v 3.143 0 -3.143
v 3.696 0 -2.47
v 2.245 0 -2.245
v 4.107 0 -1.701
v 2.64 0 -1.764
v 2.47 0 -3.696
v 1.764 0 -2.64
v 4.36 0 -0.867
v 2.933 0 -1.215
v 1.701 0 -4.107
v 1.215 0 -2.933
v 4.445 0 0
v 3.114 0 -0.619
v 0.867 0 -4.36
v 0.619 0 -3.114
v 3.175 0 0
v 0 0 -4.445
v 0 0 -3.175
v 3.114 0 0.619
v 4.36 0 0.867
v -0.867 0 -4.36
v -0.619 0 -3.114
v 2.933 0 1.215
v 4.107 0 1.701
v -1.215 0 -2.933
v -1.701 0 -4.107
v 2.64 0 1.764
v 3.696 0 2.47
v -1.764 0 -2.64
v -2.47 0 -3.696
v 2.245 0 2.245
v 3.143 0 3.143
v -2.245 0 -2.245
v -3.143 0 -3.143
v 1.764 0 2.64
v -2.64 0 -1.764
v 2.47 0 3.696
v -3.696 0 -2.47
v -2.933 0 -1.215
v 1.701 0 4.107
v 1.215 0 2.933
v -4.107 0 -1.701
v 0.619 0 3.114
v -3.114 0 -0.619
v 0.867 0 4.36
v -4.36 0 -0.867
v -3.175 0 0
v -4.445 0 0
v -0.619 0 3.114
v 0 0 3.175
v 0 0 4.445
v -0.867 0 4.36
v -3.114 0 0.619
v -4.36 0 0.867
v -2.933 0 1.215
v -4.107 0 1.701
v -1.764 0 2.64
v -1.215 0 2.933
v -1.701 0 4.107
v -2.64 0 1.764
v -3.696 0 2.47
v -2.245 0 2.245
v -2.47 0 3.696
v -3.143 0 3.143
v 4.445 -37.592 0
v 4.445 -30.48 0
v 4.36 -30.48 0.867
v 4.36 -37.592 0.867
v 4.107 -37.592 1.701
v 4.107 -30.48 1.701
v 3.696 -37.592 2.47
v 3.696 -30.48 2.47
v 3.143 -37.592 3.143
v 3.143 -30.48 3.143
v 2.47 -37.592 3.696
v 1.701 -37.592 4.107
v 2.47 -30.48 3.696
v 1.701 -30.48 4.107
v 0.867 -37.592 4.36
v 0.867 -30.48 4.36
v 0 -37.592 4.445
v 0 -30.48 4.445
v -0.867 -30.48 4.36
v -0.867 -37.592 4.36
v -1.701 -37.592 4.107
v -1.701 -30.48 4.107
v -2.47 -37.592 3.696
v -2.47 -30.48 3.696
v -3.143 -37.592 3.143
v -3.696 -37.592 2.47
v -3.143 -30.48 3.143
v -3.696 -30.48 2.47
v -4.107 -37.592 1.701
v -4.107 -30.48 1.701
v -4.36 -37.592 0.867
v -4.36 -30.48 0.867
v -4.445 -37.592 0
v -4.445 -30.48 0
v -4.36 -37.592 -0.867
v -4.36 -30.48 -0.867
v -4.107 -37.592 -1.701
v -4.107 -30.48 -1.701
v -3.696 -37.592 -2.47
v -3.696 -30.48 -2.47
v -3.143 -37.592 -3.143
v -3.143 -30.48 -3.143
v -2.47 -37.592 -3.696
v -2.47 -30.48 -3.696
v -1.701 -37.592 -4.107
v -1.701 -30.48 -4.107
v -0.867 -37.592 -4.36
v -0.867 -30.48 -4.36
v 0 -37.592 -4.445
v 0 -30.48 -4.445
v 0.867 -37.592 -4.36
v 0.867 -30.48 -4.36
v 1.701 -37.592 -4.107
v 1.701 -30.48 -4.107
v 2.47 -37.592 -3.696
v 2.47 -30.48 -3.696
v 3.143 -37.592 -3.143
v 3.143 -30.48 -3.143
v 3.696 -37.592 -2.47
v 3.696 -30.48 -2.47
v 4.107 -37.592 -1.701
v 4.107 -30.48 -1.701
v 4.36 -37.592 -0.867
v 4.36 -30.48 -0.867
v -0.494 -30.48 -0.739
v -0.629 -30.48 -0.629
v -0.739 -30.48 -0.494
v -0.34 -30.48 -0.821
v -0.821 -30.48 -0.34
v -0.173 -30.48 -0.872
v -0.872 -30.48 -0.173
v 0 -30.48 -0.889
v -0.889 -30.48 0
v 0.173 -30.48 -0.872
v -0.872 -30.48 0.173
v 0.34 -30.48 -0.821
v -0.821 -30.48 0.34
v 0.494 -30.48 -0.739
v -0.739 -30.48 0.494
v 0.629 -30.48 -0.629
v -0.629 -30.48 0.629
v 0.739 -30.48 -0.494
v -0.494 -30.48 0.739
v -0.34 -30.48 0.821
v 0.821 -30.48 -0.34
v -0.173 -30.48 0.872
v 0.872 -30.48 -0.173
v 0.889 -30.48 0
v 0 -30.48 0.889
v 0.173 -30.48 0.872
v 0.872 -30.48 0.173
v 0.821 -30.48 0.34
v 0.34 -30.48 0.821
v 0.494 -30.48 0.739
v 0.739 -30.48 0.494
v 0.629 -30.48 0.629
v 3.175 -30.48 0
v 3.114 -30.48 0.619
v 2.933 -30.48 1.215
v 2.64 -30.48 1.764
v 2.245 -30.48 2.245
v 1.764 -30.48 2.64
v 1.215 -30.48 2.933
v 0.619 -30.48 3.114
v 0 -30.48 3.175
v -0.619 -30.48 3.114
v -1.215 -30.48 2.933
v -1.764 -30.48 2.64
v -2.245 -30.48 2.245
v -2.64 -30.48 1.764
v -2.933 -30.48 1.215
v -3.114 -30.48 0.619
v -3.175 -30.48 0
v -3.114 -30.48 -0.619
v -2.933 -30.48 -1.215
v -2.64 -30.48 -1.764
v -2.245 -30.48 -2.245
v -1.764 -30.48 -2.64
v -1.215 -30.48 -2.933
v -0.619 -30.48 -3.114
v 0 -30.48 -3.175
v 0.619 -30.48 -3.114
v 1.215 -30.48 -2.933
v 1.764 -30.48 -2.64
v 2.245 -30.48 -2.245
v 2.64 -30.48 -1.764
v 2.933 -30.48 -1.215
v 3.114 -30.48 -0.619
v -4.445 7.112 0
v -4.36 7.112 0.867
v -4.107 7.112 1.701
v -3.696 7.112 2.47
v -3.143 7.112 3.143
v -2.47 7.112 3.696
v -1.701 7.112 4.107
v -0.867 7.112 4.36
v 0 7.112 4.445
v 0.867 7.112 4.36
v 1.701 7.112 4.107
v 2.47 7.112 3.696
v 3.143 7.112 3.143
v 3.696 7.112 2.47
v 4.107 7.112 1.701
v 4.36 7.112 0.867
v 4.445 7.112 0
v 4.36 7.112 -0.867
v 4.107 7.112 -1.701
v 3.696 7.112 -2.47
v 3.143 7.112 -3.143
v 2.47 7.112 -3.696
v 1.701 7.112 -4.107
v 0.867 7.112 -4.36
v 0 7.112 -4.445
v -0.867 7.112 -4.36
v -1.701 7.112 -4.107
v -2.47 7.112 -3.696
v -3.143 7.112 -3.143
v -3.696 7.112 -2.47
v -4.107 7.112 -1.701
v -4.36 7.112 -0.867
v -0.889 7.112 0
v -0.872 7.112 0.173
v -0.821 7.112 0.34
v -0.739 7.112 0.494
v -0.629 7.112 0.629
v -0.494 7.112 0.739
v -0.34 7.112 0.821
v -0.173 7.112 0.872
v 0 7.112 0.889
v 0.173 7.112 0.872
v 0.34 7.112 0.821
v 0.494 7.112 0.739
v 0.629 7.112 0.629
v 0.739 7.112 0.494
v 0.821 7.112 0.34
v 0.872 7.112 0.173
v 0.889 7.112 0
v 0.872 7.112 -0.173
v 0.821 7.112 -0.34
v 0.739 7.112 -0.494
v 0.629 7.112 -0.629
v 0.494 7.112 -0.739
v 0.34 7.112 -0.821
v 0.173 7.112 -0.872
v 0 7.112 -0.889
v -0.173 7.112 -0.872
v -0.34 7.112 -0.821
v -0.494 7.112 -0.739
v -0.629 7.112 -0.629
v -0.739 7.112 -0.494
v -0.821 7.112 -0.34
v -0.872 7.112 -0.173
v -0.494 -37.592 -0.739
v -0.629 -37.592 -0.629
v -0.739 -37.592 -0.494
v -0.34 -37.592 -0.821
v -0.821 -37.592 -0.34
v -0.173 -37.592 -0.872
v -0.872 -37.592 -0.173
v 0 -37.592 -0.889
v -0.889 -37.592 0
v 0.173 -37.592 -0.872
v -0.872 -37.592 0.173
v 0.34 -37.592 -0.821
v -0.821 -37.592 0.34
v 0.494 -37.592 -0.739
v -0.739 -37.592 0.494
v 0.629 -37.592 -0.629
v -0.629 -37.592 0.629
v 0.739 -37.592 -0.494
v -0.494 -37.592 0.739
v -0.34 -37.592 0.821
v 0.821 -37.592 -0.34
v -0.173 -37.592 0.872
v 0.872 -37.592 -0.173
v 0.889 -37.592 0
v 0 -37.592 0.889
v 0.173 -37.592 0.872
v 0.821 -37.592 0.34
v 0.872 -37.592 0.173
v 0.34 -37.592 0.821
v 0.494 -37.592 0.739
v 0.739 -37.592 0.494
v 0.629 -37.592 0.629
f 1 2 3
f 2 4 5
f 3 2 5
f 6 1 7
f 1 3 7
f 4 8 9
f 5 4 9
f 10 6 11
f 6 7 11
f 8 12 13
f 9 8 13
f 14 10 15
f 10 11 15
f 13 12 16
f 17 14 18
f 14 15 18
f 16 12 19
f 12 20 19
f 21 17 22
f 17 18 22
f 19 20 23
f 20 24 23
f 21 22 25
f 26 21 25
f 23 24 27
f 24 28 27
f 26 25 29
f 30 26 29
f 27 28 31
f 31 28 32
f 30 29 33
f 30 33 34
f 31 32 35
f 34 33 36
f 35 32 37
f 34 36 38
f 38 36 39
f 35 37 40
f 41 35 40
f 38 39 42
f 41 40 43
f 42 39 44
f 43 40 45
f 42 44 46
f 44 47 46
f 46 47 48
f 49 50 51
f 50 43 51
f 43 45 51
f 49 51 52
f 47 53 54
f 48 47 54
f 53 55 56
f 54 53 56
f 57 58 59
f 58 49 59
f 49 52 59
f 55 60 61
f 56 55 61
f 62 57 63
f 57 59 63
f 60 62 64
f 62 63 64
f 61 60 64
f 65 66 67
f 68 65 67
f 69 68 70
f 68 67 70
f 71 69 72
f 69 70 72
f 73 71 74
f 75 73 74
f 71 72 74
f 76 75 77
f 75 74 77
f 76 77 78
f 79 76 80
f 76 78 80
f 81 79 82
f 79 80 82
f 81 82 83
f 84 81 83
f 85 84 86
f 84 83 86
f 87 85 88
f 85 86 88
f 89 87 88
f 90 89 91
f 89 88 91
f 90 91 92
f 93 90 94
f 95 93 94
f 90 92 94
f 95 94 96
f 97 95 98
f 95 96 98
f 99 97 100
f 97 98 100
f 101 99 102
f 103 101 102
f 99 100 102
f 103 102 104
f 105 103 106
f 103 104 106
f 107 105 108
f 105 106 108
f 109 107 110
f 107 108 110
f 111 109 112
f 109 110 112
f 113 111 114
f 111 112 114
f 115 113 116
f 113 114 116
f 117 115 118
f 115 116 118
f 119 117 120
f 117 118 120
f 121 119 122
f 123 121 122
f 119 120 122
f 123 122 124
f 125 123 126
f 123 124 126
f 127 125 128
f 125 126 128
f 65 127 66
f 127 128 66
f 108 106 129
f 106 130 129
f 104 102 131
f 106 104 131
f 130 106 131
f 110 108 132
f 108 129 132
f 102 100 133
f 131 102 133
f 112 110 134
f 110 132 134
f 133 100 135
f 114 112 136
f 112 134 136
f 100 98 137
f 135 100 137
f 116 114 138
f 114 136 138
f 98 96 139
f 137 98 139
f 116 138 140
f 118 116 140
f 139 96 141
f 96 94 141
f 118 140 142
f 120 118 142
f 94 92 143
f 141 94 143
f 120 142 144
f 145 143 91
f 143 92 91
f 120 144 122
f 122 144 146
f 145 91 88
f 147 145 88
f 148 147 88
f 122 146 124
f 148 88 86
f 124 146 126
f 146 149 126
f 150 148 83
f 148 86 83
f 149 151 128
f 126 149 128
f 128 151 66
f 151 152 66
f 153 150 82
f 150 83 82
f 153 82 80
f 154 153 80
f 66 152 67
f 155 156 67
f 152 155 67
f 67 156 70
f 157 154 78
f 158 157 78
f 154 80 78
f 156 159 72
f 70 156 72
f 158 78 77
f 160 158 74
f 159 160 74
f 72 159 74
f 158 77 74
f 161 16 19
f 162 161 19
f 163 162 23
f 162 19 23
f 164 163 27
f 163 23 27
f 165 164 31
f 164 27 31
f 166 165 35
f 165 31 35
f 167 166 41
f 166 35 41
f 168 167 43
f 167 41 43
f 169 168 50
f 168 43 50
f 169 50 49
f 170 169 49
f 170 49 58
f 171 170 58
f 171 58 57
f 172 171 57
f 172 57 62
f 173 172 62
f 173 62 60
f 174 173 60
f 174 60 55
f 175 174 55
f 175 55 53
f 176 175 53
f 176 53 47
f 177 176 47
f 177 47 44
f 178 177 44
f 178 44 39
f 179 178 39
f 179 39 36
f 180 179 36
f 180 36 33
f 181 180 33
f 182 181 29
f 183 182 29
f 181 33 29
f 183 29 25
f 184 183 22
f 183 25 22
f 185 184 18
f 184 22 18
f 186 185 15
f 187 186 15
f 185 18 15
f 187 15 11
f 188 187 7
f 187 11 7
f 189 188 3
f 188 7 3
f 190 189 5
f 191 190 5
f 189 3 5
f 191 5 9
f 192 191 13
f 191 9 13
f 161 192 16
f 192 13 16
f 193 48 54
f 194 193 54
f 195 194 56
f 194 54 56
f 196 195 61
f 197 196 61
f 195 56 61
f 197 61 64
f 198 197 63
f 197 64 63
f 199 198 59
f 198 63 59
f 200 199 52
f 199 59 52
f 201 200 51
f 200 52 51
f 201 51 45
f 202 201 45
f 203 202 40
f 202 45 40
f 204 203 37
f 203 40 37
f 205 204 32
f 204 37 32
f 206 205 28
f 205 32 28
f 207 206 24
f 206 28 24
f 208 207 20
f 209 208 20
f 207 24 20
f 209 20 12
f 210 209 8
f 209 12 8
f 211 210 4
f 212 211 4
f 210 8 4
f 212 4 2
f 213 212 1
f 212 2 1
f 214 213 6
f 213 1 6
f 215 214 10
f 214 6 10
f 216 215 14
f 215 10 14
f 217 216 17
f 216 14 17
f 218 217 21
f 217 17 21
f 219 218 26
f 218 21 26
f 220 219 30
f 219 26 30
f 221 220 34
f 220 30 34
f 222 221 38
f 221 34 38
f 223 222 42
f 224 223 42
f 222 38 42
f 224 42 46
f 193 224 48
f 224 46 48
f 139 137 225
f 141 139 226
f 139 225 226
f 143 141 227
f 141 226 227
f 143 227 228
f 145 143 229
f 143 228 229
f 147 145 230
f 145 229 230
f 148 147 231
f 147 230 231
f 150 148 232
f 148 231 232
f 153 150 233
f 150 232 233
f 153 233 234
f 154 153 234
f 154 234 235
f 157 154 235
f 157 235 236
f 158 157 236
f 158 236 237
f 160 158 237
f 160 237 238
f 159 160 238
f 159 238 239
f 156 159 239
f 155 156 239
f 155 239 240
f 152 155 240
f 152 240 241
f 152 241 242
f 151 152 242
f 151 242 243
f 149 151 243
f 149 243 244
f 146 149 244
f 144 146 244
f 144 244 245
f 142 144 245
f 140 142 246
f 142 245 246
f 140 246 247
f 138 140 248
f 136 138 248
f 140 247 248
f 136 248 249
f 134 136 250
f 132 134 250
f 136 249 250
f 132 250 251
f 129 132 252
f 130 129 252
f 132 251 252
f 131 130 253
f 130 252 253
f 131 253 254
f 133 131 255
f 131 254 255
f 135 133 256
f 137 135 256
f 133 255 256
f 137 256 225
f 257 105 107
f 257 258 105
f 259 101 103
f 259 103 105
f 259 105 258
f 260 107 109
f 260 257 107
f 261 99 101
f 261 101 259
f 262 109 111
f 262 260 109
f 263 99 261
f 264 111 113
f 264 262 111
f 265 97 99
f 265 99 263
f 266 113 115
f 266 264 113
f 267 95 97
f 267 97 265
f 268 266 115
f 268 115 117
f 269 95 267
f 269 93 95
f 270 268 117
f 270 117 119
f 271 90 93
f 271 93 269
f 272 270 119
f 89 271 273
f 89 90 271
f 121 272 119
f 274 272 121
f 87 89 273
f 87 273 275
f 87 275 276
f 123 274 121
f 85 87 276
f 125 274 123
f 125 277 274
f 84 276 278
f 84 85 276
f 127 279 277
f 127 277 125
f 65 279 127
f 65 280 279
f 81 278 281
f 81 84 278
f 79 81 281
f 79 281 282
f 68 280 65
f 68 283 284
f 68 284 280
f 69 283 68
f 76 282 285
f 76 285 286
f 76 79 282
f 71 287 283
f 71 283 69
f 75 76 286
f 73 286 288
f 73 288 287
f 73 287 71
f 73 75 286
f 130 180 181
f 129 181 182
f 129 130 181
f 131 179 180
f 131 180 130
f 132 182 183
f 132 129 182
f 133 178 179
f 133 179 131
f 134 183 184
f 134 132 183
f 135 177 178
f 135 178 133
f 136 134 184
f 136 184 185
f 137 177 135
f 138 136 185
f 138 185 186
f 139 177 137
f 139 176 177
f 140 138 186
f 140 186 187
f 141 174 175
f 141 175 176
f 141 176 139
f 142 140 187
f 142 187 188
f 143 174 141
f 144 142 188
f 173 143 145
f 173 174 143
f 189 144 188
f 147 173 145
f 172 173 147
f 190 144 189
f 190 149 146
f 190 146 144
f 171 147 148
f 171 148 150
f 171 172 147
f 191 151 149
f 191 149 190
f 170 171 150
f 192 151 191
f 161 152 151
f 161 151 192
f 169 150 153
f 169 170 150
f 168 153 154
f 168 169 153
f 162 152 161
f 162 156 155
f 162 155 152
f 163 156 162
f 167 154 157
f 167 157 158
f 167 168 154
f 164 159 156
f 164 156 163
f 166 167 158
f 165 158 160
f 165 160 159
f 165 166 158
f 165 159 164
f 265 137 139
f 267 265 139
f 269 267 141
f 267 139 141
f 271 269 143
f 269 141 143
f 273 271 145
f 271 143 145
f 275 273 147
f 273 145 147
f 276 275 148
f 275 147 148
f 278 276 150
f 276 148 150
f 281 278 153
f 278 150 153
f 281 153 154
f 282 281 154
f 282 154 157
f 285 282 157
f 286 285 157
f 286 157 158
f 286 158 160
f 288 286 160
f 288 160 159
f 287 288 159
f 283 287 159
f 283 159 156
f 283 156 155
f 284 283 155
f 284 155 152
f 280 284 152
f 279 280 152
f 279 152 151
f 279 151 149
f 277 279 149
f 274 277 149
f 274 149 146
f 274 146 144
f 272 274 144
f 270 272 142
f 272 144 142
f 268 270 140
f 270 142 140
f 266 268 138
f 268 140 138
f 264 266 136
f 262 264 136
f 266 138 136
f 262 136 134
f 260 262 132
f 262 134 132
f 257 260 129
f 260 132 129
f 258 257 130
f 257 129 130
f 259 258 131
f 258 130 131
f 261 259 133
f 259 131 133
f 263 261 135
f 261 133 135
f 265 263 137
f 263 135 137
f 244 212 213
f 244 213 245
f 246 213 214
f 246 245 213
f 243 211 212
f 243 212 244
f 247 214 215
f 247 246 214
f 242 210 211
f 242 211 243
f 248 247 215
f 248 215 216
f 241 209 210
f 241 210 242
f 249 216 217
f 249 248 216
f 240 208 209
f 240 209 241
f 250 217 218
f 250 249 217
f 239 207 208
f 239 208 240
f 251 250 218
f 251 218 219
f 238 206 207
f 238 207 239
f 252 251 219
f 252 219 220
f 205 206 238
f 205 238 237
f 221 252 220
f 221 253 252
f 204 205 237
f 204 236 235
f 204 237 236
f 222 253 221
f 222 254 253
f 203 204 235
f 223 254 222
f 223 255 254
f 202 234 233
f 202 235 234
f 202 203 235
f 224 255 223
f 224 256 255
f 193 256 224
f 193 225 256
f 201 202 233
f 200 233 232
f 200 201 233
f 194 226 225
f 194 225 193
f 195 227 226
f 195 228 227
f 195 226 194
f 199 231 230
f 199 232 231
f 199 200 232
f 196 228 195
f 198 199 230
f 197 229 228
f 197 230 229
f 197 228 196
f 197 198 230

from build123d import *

# Parameters (mm, degrees)
F0_R     = 3.175
F1_DEPTH = 30.48
F3_R     = 4.445
F3_R_2   = 3.175
F4_DEPTH = 7.112
F2_R     = 3.175
F5_R     = 4.445
F5_R_2   = 3.175
F6_DEPTH = 7.112
F7_R     = 0.889
F8_DEPTH = 66.294


with BuildPart() as f1:
    # F0 (on Front) → F1 (new body)
    with BuildSketch(Plane.XZ):
        Circle(F0_R)
    extrude(amount=F1_DEPTH)

    # F2 (on face) + F5 (on face) → F6 (join)
    with BuildSketch(Plane(origin=(0, 0, 0), x_dir=(-1, 0, 0), z_dir=(0, 1, 0))):
        Circle(F2_R)
    with BuildSketch(Plane(origin=(0, 0, 0), x_dir=(-1, 0, 0), z_dir=(0, 1, 0))):
        Circle(F5_R)
        Circle(F5_R_2, mode=Mode.SUBTRACT)
    extrude(amount=F6_DEPTH)


with BuildPart() as f4:
    # F3 (on face) → F4 (new body)
    with BuildSketch(Plane.XZ.offset(30.48)):
        Circle(F3_R)
        Circle(F3_R_2, mode=Mode.SUBTRACT)
        Circle(F3_R_2)
    extrude(amount=F4_DEPTH)


with BuildPart() as f8_tool:
    # F7 (on face) → F8 (new body)
    with BuildSketch(Plane(origin=(0, 7.112, 0), x_dir=(-1, 0, 0), z_dir=(0, 1, 0))):
        Circle(F7_R)
    extrude(amount=-F8_DEPTH)


with BuildPart() as f1_1:
    add(f1.part)

    # F8: cut by f8_tool
    add(f8_tool.part, mode=Mode.SUBTRACT)


with BuildPart() as f4_1:
    add(f4.part)

    # F8: cut by f8_tool
    add(f8_tool.part, mode=Mode.SUBTRACT)


solid = Compound([f1_1.part, f4_1.part])
